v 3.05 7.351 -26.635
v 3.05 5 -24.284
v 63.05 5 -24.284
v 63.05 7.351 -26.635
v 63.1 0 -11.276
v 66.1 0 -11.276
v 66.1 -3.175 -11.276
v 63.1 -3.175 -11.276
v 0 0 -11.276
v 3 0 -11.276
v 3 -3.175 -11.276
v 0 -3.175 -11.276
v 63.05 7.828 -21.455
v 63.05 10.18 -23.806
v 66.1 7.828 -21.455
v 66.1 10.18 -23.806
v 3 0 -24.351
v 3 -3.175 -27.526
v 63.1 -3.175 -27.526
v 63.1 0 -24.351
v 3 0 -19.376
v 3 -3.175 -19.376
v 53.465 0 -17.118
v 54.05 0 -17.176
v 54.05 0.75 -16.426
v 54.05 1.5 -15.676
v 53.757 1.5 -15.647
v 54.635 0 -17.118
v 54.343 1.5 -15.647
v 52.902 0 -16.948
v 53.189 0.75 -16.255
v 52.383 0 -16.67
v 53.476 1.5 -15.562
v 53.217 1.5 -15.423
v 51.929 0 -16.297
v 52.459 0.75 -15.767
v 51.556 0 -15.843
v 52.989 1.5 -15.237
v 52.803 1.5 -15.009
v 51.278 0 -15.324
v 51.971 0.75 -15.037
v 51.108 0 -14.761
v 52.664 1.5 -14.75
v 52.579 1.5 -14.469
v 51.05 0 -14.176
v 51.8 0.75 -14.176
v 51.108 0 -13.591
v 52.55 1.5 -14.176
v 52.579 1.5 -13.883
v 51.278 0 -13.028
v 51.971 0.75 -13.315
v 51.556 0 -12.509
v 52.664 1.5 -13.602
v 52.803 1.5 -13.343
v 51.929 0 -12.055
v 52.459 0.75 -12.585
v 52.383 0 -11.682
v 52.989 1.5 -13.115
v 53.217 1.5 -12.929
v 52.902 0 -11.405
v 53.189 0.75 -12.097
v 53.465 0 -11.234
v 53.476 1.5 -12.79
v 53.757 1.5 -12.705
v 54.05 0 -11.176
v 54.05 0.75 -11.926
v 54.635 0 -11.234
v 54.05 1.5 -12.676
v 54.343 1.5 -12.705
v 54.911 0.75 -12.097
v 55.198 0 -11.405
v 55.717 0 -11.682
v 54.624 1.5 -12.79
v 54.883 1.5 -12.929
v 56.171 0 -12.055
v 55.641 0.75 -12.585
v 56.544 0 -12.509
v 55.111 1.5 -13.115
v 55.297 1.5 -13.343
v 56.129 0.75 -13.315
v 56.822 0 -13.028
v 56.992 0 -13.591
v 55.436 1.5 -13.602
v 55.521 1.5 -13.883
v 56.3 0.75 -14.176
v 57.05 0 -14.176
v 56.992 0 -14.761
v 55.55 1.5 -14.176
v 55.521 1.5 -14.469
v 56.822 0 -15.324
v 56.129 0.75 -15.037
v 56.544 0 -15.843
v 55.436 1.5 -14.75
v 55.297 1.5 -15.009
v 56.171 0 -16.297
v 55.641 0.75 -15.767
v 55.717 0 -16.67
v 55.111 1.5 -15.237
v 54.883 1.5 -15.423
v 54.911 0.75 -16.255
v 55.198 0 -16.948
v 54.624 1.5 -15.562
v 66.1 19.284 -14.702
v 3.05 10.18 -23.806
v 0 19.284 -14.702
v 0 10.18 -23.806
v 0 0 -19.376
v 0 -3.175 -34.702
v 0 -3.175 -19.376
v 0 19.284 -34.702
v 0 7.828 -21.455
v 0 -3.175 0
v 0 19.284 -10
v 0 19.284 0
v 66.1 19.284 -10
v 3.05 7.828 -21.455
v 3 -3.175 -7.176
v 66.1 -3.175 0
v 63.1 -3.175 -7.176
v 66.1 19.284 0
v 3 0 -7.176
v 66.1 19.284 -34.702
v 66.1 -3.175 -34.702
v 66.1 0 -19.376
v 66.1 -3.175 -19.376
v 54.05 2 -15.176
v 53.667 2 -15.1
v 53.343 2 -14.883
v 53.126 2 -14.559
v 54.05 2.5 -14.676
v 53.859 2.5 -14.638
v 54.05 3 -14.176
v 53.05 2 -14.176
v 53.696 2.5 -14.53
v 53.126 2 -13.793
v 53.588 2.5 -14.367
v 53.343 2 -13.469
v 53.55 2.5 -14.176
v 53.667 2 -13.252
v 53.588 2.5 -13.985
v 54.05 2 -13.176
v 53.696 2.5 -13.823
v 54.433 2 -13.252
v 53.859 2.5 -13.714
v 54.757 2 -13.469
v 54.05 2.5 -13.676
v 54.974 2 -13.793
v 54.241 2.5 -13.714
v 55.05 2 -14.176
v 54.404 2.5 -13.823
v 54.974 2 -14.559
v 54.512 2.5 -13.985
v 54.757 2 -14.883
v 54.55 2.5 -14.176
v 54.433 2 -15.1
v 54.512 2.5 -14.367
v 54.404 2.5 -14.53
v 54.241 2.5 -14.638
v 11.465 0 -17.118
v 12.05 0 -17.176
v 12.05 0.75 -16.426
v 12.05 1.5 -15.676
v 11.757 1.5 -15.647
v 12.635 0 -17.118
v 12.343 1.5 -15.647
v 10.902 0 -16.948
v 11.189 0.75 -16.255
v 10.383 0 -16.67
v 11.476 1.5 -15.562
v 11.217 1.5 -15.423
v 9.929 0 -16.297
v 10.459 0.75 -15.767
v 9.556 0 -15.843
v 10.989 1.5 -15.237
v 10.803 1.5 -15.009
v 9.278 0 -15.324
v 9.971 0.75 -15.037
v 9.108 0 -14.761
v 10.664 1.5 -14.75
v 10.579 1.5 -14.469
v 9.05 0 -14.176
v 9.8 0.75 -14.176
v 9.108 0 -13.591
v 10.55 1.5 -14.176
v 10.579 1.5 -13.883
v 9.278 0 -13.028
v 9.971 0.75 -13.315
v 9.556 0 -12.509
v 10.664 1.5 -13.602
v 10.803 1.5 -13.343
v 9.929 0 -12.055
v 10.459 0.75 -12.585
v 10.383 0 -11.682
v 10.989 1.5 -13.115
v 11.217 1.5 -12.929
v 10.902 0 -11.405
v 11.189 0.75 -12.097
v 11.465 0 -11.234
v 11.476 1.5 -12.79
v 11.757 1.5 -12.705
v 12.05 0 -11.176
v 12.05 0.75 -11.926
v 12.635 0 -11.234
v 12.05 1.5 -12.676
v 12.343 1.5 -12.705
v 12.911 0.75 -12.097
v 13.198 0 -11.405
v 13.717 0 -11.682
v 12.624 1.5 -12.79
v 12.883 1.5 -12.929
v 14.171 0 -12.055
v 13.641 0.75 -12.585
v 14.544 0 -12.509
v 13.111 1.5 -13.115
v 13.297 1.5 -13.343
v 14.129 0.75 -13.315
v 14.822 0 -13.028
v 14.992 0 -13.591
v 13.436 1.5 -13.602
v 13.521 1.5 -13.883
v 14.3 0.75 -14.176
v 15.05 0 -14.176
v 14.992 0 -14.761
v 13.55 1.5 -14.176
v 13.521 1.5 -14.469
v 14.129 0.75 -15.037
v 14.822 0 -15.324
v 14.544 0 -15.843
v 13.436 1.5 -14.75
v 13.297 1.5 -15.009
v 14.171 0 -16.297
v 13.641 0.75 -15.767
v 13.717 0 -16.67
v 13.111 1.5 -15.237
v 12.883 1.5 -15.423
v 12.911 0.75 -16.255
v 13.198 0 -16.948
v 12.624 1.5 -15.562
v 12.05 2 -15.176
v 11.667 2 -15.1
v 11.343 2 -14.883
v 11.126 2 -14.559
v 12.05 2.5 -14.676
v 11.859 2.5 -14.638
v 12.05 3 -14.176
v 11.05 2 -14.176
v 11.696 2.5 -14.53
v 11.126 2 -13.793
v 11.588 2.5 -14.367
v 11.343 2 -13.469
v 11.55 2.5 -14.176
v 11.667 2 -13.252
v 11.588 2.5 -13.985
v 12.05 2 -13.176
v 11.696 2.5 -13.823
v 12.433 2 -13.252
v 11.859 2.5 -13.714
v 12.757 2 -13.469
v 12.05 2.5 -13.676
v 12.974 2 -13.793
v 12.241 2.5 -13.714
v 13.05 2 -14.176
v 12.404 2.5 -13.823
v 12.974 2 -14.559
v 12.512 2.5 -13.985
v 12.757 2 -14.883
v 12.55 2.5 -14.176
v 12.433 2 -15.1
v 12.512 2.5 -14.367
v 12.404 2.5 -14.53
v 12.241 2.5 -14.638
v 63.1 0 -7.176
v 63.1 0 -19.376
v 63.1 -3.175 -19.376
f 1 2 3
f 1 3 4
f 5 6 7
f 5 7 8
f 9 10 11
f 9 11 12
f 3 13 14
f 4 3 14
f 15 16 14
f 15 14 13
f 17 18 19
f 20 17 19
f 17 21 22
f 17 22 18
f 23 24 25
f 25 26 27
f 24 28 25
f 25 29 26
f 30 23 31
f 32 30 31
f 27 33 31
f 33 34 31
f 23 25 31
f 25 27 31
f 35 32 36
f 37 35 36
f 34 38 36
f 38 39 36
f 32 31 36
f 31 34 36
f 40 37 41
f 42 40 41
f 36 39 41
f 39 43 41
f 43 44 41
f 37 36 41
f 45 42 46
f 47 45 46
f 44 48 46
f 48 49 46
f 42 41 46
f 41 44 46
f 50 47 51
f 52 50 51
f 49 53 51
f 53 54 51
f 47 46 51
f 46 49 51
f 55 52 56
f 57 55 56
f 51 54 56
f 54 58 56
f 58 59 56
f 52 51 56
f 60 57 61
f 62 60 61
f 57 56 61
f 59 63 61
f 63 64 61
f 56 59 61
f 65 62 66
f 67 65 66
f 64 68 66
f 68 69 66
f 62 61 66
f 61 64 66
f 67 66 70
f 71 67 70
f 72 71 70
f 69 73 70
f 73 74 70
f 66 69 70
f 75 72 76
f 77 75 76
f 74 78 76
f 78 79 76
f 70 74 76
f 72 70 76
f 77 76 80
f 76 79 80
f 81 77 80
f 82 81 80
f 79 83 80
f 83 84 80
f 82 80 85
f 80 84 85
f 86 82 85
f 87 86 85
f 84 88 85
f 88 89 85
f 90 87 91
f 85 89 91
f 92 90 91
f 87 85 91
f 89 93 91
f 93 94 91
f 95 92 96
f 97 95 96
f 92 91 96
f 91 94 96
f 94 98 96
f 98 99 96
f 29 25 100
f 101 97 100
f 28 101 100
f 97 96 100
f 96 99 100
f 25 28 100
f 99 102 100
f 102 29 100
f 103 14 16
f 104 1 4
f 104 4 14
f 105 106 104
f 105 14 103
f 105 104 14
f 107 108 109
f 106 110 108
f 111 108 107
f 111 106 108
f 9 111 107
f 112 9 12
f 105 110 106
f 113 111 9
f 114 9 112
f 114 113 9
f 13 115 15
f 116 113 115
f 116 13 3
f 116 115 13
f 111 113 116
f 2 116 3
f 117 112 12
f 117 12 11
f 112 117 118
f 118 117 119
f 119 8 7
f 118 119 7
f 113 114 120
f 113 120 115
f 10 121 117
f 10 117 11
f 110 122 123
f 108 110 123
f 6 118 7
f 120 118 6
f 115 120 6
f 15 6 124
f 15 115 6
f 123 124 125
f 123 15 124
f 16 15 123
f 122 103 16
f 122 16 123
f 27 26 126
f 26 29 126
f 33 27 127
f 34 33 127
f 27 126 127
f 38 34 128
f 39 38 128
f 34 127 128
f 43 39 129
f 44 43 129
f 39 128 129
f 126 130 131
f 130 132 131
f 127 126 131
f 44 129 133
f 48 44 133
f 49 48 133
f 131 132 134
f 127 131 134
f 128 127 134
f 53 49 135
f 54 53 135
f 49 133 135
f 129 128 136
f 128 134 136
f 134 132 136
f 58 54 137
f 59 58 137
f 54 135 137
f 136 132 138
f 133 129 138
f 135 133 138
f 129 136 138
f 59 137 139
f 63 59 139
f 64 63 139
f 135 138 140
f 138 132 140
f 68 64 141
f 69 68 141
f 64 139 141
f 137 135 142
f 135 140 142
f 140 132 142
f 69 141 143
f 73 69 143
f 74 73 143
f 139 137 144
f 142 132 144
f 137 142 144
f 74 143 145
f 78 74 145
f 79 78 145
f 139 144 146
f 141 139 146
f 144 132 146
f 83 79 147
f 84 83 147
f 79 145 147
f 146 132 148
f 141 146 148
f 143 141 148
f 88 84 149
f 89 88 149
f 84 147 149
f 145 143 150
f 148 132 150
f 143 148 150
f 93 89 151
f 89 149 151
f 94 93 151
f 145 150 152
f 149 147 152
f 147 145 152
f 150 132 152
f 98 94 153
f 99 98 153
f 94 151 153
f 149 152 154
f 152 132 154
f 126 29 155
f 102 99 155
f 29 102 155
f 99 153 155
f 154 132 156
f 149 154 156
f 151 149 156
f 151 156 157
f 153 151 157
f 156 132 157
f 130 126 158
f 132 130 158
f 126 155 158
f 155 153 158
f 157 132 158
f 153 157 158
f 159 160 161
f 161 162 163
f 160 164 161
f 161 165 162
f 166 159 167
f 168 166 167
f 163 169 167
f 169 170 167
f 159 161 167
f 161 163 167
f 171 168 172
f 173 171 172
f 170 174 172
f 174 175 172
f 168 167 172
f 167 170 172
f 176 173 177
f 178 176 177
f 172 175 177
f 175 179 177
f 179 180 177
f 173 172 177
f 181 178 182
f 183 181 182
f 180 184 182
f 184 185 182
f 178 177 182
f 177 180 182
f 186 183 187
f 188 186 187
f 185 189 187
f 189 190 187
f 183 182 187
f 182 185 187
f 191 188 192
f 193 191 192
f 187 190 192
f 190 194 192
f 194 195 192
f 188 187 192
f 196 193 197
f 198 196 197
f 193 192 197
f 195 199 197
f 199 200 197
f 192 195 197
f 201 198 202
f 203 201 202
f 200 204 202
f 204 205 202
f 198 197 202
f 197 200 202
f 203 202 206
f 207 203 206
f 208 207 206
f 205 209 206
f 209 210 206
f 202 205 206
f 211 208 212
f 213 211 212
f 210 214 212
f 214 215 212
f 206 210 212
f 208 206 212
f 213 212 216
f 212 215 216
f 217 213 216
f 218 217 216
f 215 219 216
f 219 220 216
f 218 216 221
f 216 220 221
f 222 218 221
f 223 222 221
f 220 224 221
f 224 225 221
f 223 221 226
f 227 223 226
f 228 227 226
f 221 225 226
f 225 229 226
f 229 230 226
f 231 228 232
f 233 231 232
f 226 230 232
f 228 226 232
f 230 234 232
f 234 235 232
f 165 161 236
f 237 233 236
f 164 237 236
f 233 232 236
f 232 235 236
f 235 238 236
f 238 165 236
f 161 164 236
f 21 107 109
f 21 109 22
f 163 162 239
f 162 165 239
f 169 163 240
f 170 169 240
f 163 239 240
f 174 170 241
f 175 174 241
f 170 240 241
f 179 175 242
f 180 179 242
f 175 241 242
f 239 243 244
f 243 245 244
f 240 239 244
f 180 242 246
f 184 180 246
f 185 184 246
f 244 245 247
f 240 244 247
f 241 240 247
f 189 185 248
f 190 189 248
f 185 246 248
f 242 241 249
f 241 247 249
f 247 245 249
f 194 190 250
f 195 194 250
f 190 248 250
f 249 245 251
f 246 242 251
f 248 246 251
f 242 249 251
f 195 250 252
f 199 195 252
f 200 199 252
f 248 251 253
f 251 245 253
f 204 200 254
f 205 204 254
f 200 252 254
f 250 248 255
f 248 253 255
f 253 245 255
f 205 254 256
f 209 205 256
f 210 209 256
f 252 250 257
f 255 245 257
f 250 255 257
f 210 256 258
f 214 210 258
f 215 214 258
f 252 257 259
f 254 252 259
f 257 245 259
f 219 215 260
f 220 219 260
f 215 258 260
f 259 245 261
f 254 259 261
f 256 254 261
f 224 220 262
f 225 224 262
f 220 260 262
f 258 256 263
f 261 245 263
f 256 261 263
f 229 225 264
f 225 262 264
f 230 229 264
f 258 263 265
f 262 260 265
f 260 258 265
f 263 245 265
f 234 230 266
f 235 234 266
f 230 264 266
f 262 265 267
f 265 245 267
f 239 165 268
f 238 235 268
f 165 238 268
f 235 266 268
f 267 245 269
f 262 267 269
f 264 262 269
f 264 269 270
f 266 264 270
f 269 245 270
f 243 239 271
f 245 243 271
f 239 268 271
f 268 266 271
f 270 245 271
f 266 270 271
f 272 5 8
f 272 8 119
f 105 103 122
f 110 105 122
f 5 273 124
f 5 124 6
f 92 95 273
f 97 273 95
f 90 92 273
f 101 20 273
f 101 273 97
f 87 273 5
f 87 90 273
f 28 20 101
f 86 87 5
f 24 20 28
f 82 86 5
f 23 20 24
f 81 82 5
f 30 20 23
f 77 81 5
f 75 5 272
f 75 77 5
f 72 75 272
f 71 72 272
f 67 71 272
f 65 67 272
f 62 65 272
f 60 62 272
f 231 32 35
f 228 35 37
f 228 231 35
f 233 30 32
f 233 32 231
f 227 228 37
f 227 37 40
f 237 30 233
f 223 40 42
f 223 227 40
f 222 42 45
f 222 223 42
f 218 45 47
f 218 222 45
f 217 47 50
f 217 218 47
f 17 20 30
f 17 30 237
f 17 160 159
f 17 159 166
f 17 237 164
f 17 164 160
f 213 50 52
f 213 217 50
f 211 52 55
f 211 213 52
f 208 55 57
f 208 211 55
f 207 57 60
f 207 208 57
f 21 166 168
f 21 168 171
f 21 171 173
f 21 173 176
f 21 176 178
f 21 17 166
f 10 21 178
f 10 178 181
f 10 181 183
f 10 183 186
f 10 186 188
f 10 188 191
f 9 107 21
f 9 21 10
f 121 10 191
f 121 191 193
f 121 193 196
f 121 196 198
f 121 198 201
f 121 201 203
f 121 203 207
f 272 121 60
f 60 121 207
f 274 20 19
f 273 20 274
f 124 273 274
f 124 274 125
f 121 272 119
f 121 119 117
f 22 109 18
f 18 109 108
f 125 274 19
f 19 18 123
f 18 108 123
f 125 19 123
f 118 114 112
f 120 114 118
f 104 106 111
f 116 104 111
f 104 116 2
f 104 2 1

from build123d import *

# Parameters (mm, degrees)
BOSS_EXTRUDE1_DEPTH = 66.1
BOSS_EXTRUDE2_DEPTH = 3.05
BOSS_EXTRUDE3_DEPTH = 3.175
SKETCH2_4_R         = 1.5
CUT_EXTRUDE1_DEPTH  = 3
CHAMFER1_SIZE       = 1.5
CHAMFER3_SIZE       = 3.175


with BuildPart() as part:
    # Sketch1 → Boss-Extrude1 (new body)
    with BuildSketch(Plane(origin=(0, 0, 0), x_dir=(0, 0, -1), z_dir=(1, 0, 0))):
        Polygon((14.702260095, 19.28355698), (34.702260095, 19.28355698), (34.702260095, 0), (0, 0), (0, 19.28355698), (10, 19.28355698), (24.28355698, 5), (26.634687027, 7.351130047), align=None)
    extrude(amount=BOSS_EXTRUDE1_DEPTH)

    # Sketch1<4> → Boss-Extrude2 (add)
    with BuildSketch(Plane(origin=(0, 0, 0), x_dir=(0, 0, -1), z_dir=(1, 0, 0))):
        Polygon((23.806259903, 10.179557172), (21.455129855, 7.828427125), (24.28355698, 5), (26.634687027, 7.351130047), align=None)
    boss_extrude2 = extrude(amount=BOSS_EXTRUDE2_DEPTH)

    # Mirror1: Boss-Extrude2 across plane
    add(boss_extrude2.mirror(Plane.ZY.offset(-33.05)))

    # Sketch2 → Boss-Extrude3 (add)
    with BuildSketch(Plane(origin=(0, 0, 0), x_dir=(1, 0, 0), z_dir=(0, 1, 0))):
        Polygon((0, 11.276130047), (0, 0), (66.1, 0), (66.1, 11.276130047), (63.1, 11.276130047), (63.1, 7.176130047), (3, 7.176130047), (3, 11.276130047), align=None)
        Polygon((0, 34.702260095), (0, 19.376130047), (3, 19.376130047), (3, 27.526130047), (63.1, 27.526130047), (63.1, 19.376130047), (66.1, 19.376130047), (66.1, 34.702260095), align=None)
    extrude(amount=-BOSS_EXTRUDE3_DEPTH)

    # Sketch2<4> → Cut-Extrude1 (cut)
    with BuildSketch(Plane(origin=(0, 0, 0), x_dir=(1, 0, 0), z_dir=(0, 1, 0))):
        with Locations(Location((54.05, 14.176130047, 0), (0, 0, 90))):
            Circle(SKETCH2_4_R)
        with Locations(Location((12.05, 14.176130047, 0), (0, 0, 90))):
            Circle(SKETCH2_4_R)
    extrude(amount=CUT_EXTRUDE1_DEPTH, mode=Mode.SUBTRACT)

    # Chamfer1
    chamfer1_edges = [part.edges().sort_by_distance(p)[0] for p in [
        (54.05, 3, -12.676130047),
        (54.05, 0, -12.676130047),
        (12.05, 0, -12.676130047),
        (12.05, 3, -12.676130047),
    ]]
    chamfer(chamfer1_edges, length=CHAMFER1_SIZE - 0.0001)  # a hair under: the kernel refuses the full size

    # Chamfer3
    chamfer3_edges = [part.edges().sort_by_distance(p)[0] for p in [
        (33.05, 0, -27.526130047),
    ]]
    chamfer(chamfer3_edges, length=CHAMFER3_SIZE - 0.0001)  # a hair under: the kernel refuses the full size


solid = part.part
